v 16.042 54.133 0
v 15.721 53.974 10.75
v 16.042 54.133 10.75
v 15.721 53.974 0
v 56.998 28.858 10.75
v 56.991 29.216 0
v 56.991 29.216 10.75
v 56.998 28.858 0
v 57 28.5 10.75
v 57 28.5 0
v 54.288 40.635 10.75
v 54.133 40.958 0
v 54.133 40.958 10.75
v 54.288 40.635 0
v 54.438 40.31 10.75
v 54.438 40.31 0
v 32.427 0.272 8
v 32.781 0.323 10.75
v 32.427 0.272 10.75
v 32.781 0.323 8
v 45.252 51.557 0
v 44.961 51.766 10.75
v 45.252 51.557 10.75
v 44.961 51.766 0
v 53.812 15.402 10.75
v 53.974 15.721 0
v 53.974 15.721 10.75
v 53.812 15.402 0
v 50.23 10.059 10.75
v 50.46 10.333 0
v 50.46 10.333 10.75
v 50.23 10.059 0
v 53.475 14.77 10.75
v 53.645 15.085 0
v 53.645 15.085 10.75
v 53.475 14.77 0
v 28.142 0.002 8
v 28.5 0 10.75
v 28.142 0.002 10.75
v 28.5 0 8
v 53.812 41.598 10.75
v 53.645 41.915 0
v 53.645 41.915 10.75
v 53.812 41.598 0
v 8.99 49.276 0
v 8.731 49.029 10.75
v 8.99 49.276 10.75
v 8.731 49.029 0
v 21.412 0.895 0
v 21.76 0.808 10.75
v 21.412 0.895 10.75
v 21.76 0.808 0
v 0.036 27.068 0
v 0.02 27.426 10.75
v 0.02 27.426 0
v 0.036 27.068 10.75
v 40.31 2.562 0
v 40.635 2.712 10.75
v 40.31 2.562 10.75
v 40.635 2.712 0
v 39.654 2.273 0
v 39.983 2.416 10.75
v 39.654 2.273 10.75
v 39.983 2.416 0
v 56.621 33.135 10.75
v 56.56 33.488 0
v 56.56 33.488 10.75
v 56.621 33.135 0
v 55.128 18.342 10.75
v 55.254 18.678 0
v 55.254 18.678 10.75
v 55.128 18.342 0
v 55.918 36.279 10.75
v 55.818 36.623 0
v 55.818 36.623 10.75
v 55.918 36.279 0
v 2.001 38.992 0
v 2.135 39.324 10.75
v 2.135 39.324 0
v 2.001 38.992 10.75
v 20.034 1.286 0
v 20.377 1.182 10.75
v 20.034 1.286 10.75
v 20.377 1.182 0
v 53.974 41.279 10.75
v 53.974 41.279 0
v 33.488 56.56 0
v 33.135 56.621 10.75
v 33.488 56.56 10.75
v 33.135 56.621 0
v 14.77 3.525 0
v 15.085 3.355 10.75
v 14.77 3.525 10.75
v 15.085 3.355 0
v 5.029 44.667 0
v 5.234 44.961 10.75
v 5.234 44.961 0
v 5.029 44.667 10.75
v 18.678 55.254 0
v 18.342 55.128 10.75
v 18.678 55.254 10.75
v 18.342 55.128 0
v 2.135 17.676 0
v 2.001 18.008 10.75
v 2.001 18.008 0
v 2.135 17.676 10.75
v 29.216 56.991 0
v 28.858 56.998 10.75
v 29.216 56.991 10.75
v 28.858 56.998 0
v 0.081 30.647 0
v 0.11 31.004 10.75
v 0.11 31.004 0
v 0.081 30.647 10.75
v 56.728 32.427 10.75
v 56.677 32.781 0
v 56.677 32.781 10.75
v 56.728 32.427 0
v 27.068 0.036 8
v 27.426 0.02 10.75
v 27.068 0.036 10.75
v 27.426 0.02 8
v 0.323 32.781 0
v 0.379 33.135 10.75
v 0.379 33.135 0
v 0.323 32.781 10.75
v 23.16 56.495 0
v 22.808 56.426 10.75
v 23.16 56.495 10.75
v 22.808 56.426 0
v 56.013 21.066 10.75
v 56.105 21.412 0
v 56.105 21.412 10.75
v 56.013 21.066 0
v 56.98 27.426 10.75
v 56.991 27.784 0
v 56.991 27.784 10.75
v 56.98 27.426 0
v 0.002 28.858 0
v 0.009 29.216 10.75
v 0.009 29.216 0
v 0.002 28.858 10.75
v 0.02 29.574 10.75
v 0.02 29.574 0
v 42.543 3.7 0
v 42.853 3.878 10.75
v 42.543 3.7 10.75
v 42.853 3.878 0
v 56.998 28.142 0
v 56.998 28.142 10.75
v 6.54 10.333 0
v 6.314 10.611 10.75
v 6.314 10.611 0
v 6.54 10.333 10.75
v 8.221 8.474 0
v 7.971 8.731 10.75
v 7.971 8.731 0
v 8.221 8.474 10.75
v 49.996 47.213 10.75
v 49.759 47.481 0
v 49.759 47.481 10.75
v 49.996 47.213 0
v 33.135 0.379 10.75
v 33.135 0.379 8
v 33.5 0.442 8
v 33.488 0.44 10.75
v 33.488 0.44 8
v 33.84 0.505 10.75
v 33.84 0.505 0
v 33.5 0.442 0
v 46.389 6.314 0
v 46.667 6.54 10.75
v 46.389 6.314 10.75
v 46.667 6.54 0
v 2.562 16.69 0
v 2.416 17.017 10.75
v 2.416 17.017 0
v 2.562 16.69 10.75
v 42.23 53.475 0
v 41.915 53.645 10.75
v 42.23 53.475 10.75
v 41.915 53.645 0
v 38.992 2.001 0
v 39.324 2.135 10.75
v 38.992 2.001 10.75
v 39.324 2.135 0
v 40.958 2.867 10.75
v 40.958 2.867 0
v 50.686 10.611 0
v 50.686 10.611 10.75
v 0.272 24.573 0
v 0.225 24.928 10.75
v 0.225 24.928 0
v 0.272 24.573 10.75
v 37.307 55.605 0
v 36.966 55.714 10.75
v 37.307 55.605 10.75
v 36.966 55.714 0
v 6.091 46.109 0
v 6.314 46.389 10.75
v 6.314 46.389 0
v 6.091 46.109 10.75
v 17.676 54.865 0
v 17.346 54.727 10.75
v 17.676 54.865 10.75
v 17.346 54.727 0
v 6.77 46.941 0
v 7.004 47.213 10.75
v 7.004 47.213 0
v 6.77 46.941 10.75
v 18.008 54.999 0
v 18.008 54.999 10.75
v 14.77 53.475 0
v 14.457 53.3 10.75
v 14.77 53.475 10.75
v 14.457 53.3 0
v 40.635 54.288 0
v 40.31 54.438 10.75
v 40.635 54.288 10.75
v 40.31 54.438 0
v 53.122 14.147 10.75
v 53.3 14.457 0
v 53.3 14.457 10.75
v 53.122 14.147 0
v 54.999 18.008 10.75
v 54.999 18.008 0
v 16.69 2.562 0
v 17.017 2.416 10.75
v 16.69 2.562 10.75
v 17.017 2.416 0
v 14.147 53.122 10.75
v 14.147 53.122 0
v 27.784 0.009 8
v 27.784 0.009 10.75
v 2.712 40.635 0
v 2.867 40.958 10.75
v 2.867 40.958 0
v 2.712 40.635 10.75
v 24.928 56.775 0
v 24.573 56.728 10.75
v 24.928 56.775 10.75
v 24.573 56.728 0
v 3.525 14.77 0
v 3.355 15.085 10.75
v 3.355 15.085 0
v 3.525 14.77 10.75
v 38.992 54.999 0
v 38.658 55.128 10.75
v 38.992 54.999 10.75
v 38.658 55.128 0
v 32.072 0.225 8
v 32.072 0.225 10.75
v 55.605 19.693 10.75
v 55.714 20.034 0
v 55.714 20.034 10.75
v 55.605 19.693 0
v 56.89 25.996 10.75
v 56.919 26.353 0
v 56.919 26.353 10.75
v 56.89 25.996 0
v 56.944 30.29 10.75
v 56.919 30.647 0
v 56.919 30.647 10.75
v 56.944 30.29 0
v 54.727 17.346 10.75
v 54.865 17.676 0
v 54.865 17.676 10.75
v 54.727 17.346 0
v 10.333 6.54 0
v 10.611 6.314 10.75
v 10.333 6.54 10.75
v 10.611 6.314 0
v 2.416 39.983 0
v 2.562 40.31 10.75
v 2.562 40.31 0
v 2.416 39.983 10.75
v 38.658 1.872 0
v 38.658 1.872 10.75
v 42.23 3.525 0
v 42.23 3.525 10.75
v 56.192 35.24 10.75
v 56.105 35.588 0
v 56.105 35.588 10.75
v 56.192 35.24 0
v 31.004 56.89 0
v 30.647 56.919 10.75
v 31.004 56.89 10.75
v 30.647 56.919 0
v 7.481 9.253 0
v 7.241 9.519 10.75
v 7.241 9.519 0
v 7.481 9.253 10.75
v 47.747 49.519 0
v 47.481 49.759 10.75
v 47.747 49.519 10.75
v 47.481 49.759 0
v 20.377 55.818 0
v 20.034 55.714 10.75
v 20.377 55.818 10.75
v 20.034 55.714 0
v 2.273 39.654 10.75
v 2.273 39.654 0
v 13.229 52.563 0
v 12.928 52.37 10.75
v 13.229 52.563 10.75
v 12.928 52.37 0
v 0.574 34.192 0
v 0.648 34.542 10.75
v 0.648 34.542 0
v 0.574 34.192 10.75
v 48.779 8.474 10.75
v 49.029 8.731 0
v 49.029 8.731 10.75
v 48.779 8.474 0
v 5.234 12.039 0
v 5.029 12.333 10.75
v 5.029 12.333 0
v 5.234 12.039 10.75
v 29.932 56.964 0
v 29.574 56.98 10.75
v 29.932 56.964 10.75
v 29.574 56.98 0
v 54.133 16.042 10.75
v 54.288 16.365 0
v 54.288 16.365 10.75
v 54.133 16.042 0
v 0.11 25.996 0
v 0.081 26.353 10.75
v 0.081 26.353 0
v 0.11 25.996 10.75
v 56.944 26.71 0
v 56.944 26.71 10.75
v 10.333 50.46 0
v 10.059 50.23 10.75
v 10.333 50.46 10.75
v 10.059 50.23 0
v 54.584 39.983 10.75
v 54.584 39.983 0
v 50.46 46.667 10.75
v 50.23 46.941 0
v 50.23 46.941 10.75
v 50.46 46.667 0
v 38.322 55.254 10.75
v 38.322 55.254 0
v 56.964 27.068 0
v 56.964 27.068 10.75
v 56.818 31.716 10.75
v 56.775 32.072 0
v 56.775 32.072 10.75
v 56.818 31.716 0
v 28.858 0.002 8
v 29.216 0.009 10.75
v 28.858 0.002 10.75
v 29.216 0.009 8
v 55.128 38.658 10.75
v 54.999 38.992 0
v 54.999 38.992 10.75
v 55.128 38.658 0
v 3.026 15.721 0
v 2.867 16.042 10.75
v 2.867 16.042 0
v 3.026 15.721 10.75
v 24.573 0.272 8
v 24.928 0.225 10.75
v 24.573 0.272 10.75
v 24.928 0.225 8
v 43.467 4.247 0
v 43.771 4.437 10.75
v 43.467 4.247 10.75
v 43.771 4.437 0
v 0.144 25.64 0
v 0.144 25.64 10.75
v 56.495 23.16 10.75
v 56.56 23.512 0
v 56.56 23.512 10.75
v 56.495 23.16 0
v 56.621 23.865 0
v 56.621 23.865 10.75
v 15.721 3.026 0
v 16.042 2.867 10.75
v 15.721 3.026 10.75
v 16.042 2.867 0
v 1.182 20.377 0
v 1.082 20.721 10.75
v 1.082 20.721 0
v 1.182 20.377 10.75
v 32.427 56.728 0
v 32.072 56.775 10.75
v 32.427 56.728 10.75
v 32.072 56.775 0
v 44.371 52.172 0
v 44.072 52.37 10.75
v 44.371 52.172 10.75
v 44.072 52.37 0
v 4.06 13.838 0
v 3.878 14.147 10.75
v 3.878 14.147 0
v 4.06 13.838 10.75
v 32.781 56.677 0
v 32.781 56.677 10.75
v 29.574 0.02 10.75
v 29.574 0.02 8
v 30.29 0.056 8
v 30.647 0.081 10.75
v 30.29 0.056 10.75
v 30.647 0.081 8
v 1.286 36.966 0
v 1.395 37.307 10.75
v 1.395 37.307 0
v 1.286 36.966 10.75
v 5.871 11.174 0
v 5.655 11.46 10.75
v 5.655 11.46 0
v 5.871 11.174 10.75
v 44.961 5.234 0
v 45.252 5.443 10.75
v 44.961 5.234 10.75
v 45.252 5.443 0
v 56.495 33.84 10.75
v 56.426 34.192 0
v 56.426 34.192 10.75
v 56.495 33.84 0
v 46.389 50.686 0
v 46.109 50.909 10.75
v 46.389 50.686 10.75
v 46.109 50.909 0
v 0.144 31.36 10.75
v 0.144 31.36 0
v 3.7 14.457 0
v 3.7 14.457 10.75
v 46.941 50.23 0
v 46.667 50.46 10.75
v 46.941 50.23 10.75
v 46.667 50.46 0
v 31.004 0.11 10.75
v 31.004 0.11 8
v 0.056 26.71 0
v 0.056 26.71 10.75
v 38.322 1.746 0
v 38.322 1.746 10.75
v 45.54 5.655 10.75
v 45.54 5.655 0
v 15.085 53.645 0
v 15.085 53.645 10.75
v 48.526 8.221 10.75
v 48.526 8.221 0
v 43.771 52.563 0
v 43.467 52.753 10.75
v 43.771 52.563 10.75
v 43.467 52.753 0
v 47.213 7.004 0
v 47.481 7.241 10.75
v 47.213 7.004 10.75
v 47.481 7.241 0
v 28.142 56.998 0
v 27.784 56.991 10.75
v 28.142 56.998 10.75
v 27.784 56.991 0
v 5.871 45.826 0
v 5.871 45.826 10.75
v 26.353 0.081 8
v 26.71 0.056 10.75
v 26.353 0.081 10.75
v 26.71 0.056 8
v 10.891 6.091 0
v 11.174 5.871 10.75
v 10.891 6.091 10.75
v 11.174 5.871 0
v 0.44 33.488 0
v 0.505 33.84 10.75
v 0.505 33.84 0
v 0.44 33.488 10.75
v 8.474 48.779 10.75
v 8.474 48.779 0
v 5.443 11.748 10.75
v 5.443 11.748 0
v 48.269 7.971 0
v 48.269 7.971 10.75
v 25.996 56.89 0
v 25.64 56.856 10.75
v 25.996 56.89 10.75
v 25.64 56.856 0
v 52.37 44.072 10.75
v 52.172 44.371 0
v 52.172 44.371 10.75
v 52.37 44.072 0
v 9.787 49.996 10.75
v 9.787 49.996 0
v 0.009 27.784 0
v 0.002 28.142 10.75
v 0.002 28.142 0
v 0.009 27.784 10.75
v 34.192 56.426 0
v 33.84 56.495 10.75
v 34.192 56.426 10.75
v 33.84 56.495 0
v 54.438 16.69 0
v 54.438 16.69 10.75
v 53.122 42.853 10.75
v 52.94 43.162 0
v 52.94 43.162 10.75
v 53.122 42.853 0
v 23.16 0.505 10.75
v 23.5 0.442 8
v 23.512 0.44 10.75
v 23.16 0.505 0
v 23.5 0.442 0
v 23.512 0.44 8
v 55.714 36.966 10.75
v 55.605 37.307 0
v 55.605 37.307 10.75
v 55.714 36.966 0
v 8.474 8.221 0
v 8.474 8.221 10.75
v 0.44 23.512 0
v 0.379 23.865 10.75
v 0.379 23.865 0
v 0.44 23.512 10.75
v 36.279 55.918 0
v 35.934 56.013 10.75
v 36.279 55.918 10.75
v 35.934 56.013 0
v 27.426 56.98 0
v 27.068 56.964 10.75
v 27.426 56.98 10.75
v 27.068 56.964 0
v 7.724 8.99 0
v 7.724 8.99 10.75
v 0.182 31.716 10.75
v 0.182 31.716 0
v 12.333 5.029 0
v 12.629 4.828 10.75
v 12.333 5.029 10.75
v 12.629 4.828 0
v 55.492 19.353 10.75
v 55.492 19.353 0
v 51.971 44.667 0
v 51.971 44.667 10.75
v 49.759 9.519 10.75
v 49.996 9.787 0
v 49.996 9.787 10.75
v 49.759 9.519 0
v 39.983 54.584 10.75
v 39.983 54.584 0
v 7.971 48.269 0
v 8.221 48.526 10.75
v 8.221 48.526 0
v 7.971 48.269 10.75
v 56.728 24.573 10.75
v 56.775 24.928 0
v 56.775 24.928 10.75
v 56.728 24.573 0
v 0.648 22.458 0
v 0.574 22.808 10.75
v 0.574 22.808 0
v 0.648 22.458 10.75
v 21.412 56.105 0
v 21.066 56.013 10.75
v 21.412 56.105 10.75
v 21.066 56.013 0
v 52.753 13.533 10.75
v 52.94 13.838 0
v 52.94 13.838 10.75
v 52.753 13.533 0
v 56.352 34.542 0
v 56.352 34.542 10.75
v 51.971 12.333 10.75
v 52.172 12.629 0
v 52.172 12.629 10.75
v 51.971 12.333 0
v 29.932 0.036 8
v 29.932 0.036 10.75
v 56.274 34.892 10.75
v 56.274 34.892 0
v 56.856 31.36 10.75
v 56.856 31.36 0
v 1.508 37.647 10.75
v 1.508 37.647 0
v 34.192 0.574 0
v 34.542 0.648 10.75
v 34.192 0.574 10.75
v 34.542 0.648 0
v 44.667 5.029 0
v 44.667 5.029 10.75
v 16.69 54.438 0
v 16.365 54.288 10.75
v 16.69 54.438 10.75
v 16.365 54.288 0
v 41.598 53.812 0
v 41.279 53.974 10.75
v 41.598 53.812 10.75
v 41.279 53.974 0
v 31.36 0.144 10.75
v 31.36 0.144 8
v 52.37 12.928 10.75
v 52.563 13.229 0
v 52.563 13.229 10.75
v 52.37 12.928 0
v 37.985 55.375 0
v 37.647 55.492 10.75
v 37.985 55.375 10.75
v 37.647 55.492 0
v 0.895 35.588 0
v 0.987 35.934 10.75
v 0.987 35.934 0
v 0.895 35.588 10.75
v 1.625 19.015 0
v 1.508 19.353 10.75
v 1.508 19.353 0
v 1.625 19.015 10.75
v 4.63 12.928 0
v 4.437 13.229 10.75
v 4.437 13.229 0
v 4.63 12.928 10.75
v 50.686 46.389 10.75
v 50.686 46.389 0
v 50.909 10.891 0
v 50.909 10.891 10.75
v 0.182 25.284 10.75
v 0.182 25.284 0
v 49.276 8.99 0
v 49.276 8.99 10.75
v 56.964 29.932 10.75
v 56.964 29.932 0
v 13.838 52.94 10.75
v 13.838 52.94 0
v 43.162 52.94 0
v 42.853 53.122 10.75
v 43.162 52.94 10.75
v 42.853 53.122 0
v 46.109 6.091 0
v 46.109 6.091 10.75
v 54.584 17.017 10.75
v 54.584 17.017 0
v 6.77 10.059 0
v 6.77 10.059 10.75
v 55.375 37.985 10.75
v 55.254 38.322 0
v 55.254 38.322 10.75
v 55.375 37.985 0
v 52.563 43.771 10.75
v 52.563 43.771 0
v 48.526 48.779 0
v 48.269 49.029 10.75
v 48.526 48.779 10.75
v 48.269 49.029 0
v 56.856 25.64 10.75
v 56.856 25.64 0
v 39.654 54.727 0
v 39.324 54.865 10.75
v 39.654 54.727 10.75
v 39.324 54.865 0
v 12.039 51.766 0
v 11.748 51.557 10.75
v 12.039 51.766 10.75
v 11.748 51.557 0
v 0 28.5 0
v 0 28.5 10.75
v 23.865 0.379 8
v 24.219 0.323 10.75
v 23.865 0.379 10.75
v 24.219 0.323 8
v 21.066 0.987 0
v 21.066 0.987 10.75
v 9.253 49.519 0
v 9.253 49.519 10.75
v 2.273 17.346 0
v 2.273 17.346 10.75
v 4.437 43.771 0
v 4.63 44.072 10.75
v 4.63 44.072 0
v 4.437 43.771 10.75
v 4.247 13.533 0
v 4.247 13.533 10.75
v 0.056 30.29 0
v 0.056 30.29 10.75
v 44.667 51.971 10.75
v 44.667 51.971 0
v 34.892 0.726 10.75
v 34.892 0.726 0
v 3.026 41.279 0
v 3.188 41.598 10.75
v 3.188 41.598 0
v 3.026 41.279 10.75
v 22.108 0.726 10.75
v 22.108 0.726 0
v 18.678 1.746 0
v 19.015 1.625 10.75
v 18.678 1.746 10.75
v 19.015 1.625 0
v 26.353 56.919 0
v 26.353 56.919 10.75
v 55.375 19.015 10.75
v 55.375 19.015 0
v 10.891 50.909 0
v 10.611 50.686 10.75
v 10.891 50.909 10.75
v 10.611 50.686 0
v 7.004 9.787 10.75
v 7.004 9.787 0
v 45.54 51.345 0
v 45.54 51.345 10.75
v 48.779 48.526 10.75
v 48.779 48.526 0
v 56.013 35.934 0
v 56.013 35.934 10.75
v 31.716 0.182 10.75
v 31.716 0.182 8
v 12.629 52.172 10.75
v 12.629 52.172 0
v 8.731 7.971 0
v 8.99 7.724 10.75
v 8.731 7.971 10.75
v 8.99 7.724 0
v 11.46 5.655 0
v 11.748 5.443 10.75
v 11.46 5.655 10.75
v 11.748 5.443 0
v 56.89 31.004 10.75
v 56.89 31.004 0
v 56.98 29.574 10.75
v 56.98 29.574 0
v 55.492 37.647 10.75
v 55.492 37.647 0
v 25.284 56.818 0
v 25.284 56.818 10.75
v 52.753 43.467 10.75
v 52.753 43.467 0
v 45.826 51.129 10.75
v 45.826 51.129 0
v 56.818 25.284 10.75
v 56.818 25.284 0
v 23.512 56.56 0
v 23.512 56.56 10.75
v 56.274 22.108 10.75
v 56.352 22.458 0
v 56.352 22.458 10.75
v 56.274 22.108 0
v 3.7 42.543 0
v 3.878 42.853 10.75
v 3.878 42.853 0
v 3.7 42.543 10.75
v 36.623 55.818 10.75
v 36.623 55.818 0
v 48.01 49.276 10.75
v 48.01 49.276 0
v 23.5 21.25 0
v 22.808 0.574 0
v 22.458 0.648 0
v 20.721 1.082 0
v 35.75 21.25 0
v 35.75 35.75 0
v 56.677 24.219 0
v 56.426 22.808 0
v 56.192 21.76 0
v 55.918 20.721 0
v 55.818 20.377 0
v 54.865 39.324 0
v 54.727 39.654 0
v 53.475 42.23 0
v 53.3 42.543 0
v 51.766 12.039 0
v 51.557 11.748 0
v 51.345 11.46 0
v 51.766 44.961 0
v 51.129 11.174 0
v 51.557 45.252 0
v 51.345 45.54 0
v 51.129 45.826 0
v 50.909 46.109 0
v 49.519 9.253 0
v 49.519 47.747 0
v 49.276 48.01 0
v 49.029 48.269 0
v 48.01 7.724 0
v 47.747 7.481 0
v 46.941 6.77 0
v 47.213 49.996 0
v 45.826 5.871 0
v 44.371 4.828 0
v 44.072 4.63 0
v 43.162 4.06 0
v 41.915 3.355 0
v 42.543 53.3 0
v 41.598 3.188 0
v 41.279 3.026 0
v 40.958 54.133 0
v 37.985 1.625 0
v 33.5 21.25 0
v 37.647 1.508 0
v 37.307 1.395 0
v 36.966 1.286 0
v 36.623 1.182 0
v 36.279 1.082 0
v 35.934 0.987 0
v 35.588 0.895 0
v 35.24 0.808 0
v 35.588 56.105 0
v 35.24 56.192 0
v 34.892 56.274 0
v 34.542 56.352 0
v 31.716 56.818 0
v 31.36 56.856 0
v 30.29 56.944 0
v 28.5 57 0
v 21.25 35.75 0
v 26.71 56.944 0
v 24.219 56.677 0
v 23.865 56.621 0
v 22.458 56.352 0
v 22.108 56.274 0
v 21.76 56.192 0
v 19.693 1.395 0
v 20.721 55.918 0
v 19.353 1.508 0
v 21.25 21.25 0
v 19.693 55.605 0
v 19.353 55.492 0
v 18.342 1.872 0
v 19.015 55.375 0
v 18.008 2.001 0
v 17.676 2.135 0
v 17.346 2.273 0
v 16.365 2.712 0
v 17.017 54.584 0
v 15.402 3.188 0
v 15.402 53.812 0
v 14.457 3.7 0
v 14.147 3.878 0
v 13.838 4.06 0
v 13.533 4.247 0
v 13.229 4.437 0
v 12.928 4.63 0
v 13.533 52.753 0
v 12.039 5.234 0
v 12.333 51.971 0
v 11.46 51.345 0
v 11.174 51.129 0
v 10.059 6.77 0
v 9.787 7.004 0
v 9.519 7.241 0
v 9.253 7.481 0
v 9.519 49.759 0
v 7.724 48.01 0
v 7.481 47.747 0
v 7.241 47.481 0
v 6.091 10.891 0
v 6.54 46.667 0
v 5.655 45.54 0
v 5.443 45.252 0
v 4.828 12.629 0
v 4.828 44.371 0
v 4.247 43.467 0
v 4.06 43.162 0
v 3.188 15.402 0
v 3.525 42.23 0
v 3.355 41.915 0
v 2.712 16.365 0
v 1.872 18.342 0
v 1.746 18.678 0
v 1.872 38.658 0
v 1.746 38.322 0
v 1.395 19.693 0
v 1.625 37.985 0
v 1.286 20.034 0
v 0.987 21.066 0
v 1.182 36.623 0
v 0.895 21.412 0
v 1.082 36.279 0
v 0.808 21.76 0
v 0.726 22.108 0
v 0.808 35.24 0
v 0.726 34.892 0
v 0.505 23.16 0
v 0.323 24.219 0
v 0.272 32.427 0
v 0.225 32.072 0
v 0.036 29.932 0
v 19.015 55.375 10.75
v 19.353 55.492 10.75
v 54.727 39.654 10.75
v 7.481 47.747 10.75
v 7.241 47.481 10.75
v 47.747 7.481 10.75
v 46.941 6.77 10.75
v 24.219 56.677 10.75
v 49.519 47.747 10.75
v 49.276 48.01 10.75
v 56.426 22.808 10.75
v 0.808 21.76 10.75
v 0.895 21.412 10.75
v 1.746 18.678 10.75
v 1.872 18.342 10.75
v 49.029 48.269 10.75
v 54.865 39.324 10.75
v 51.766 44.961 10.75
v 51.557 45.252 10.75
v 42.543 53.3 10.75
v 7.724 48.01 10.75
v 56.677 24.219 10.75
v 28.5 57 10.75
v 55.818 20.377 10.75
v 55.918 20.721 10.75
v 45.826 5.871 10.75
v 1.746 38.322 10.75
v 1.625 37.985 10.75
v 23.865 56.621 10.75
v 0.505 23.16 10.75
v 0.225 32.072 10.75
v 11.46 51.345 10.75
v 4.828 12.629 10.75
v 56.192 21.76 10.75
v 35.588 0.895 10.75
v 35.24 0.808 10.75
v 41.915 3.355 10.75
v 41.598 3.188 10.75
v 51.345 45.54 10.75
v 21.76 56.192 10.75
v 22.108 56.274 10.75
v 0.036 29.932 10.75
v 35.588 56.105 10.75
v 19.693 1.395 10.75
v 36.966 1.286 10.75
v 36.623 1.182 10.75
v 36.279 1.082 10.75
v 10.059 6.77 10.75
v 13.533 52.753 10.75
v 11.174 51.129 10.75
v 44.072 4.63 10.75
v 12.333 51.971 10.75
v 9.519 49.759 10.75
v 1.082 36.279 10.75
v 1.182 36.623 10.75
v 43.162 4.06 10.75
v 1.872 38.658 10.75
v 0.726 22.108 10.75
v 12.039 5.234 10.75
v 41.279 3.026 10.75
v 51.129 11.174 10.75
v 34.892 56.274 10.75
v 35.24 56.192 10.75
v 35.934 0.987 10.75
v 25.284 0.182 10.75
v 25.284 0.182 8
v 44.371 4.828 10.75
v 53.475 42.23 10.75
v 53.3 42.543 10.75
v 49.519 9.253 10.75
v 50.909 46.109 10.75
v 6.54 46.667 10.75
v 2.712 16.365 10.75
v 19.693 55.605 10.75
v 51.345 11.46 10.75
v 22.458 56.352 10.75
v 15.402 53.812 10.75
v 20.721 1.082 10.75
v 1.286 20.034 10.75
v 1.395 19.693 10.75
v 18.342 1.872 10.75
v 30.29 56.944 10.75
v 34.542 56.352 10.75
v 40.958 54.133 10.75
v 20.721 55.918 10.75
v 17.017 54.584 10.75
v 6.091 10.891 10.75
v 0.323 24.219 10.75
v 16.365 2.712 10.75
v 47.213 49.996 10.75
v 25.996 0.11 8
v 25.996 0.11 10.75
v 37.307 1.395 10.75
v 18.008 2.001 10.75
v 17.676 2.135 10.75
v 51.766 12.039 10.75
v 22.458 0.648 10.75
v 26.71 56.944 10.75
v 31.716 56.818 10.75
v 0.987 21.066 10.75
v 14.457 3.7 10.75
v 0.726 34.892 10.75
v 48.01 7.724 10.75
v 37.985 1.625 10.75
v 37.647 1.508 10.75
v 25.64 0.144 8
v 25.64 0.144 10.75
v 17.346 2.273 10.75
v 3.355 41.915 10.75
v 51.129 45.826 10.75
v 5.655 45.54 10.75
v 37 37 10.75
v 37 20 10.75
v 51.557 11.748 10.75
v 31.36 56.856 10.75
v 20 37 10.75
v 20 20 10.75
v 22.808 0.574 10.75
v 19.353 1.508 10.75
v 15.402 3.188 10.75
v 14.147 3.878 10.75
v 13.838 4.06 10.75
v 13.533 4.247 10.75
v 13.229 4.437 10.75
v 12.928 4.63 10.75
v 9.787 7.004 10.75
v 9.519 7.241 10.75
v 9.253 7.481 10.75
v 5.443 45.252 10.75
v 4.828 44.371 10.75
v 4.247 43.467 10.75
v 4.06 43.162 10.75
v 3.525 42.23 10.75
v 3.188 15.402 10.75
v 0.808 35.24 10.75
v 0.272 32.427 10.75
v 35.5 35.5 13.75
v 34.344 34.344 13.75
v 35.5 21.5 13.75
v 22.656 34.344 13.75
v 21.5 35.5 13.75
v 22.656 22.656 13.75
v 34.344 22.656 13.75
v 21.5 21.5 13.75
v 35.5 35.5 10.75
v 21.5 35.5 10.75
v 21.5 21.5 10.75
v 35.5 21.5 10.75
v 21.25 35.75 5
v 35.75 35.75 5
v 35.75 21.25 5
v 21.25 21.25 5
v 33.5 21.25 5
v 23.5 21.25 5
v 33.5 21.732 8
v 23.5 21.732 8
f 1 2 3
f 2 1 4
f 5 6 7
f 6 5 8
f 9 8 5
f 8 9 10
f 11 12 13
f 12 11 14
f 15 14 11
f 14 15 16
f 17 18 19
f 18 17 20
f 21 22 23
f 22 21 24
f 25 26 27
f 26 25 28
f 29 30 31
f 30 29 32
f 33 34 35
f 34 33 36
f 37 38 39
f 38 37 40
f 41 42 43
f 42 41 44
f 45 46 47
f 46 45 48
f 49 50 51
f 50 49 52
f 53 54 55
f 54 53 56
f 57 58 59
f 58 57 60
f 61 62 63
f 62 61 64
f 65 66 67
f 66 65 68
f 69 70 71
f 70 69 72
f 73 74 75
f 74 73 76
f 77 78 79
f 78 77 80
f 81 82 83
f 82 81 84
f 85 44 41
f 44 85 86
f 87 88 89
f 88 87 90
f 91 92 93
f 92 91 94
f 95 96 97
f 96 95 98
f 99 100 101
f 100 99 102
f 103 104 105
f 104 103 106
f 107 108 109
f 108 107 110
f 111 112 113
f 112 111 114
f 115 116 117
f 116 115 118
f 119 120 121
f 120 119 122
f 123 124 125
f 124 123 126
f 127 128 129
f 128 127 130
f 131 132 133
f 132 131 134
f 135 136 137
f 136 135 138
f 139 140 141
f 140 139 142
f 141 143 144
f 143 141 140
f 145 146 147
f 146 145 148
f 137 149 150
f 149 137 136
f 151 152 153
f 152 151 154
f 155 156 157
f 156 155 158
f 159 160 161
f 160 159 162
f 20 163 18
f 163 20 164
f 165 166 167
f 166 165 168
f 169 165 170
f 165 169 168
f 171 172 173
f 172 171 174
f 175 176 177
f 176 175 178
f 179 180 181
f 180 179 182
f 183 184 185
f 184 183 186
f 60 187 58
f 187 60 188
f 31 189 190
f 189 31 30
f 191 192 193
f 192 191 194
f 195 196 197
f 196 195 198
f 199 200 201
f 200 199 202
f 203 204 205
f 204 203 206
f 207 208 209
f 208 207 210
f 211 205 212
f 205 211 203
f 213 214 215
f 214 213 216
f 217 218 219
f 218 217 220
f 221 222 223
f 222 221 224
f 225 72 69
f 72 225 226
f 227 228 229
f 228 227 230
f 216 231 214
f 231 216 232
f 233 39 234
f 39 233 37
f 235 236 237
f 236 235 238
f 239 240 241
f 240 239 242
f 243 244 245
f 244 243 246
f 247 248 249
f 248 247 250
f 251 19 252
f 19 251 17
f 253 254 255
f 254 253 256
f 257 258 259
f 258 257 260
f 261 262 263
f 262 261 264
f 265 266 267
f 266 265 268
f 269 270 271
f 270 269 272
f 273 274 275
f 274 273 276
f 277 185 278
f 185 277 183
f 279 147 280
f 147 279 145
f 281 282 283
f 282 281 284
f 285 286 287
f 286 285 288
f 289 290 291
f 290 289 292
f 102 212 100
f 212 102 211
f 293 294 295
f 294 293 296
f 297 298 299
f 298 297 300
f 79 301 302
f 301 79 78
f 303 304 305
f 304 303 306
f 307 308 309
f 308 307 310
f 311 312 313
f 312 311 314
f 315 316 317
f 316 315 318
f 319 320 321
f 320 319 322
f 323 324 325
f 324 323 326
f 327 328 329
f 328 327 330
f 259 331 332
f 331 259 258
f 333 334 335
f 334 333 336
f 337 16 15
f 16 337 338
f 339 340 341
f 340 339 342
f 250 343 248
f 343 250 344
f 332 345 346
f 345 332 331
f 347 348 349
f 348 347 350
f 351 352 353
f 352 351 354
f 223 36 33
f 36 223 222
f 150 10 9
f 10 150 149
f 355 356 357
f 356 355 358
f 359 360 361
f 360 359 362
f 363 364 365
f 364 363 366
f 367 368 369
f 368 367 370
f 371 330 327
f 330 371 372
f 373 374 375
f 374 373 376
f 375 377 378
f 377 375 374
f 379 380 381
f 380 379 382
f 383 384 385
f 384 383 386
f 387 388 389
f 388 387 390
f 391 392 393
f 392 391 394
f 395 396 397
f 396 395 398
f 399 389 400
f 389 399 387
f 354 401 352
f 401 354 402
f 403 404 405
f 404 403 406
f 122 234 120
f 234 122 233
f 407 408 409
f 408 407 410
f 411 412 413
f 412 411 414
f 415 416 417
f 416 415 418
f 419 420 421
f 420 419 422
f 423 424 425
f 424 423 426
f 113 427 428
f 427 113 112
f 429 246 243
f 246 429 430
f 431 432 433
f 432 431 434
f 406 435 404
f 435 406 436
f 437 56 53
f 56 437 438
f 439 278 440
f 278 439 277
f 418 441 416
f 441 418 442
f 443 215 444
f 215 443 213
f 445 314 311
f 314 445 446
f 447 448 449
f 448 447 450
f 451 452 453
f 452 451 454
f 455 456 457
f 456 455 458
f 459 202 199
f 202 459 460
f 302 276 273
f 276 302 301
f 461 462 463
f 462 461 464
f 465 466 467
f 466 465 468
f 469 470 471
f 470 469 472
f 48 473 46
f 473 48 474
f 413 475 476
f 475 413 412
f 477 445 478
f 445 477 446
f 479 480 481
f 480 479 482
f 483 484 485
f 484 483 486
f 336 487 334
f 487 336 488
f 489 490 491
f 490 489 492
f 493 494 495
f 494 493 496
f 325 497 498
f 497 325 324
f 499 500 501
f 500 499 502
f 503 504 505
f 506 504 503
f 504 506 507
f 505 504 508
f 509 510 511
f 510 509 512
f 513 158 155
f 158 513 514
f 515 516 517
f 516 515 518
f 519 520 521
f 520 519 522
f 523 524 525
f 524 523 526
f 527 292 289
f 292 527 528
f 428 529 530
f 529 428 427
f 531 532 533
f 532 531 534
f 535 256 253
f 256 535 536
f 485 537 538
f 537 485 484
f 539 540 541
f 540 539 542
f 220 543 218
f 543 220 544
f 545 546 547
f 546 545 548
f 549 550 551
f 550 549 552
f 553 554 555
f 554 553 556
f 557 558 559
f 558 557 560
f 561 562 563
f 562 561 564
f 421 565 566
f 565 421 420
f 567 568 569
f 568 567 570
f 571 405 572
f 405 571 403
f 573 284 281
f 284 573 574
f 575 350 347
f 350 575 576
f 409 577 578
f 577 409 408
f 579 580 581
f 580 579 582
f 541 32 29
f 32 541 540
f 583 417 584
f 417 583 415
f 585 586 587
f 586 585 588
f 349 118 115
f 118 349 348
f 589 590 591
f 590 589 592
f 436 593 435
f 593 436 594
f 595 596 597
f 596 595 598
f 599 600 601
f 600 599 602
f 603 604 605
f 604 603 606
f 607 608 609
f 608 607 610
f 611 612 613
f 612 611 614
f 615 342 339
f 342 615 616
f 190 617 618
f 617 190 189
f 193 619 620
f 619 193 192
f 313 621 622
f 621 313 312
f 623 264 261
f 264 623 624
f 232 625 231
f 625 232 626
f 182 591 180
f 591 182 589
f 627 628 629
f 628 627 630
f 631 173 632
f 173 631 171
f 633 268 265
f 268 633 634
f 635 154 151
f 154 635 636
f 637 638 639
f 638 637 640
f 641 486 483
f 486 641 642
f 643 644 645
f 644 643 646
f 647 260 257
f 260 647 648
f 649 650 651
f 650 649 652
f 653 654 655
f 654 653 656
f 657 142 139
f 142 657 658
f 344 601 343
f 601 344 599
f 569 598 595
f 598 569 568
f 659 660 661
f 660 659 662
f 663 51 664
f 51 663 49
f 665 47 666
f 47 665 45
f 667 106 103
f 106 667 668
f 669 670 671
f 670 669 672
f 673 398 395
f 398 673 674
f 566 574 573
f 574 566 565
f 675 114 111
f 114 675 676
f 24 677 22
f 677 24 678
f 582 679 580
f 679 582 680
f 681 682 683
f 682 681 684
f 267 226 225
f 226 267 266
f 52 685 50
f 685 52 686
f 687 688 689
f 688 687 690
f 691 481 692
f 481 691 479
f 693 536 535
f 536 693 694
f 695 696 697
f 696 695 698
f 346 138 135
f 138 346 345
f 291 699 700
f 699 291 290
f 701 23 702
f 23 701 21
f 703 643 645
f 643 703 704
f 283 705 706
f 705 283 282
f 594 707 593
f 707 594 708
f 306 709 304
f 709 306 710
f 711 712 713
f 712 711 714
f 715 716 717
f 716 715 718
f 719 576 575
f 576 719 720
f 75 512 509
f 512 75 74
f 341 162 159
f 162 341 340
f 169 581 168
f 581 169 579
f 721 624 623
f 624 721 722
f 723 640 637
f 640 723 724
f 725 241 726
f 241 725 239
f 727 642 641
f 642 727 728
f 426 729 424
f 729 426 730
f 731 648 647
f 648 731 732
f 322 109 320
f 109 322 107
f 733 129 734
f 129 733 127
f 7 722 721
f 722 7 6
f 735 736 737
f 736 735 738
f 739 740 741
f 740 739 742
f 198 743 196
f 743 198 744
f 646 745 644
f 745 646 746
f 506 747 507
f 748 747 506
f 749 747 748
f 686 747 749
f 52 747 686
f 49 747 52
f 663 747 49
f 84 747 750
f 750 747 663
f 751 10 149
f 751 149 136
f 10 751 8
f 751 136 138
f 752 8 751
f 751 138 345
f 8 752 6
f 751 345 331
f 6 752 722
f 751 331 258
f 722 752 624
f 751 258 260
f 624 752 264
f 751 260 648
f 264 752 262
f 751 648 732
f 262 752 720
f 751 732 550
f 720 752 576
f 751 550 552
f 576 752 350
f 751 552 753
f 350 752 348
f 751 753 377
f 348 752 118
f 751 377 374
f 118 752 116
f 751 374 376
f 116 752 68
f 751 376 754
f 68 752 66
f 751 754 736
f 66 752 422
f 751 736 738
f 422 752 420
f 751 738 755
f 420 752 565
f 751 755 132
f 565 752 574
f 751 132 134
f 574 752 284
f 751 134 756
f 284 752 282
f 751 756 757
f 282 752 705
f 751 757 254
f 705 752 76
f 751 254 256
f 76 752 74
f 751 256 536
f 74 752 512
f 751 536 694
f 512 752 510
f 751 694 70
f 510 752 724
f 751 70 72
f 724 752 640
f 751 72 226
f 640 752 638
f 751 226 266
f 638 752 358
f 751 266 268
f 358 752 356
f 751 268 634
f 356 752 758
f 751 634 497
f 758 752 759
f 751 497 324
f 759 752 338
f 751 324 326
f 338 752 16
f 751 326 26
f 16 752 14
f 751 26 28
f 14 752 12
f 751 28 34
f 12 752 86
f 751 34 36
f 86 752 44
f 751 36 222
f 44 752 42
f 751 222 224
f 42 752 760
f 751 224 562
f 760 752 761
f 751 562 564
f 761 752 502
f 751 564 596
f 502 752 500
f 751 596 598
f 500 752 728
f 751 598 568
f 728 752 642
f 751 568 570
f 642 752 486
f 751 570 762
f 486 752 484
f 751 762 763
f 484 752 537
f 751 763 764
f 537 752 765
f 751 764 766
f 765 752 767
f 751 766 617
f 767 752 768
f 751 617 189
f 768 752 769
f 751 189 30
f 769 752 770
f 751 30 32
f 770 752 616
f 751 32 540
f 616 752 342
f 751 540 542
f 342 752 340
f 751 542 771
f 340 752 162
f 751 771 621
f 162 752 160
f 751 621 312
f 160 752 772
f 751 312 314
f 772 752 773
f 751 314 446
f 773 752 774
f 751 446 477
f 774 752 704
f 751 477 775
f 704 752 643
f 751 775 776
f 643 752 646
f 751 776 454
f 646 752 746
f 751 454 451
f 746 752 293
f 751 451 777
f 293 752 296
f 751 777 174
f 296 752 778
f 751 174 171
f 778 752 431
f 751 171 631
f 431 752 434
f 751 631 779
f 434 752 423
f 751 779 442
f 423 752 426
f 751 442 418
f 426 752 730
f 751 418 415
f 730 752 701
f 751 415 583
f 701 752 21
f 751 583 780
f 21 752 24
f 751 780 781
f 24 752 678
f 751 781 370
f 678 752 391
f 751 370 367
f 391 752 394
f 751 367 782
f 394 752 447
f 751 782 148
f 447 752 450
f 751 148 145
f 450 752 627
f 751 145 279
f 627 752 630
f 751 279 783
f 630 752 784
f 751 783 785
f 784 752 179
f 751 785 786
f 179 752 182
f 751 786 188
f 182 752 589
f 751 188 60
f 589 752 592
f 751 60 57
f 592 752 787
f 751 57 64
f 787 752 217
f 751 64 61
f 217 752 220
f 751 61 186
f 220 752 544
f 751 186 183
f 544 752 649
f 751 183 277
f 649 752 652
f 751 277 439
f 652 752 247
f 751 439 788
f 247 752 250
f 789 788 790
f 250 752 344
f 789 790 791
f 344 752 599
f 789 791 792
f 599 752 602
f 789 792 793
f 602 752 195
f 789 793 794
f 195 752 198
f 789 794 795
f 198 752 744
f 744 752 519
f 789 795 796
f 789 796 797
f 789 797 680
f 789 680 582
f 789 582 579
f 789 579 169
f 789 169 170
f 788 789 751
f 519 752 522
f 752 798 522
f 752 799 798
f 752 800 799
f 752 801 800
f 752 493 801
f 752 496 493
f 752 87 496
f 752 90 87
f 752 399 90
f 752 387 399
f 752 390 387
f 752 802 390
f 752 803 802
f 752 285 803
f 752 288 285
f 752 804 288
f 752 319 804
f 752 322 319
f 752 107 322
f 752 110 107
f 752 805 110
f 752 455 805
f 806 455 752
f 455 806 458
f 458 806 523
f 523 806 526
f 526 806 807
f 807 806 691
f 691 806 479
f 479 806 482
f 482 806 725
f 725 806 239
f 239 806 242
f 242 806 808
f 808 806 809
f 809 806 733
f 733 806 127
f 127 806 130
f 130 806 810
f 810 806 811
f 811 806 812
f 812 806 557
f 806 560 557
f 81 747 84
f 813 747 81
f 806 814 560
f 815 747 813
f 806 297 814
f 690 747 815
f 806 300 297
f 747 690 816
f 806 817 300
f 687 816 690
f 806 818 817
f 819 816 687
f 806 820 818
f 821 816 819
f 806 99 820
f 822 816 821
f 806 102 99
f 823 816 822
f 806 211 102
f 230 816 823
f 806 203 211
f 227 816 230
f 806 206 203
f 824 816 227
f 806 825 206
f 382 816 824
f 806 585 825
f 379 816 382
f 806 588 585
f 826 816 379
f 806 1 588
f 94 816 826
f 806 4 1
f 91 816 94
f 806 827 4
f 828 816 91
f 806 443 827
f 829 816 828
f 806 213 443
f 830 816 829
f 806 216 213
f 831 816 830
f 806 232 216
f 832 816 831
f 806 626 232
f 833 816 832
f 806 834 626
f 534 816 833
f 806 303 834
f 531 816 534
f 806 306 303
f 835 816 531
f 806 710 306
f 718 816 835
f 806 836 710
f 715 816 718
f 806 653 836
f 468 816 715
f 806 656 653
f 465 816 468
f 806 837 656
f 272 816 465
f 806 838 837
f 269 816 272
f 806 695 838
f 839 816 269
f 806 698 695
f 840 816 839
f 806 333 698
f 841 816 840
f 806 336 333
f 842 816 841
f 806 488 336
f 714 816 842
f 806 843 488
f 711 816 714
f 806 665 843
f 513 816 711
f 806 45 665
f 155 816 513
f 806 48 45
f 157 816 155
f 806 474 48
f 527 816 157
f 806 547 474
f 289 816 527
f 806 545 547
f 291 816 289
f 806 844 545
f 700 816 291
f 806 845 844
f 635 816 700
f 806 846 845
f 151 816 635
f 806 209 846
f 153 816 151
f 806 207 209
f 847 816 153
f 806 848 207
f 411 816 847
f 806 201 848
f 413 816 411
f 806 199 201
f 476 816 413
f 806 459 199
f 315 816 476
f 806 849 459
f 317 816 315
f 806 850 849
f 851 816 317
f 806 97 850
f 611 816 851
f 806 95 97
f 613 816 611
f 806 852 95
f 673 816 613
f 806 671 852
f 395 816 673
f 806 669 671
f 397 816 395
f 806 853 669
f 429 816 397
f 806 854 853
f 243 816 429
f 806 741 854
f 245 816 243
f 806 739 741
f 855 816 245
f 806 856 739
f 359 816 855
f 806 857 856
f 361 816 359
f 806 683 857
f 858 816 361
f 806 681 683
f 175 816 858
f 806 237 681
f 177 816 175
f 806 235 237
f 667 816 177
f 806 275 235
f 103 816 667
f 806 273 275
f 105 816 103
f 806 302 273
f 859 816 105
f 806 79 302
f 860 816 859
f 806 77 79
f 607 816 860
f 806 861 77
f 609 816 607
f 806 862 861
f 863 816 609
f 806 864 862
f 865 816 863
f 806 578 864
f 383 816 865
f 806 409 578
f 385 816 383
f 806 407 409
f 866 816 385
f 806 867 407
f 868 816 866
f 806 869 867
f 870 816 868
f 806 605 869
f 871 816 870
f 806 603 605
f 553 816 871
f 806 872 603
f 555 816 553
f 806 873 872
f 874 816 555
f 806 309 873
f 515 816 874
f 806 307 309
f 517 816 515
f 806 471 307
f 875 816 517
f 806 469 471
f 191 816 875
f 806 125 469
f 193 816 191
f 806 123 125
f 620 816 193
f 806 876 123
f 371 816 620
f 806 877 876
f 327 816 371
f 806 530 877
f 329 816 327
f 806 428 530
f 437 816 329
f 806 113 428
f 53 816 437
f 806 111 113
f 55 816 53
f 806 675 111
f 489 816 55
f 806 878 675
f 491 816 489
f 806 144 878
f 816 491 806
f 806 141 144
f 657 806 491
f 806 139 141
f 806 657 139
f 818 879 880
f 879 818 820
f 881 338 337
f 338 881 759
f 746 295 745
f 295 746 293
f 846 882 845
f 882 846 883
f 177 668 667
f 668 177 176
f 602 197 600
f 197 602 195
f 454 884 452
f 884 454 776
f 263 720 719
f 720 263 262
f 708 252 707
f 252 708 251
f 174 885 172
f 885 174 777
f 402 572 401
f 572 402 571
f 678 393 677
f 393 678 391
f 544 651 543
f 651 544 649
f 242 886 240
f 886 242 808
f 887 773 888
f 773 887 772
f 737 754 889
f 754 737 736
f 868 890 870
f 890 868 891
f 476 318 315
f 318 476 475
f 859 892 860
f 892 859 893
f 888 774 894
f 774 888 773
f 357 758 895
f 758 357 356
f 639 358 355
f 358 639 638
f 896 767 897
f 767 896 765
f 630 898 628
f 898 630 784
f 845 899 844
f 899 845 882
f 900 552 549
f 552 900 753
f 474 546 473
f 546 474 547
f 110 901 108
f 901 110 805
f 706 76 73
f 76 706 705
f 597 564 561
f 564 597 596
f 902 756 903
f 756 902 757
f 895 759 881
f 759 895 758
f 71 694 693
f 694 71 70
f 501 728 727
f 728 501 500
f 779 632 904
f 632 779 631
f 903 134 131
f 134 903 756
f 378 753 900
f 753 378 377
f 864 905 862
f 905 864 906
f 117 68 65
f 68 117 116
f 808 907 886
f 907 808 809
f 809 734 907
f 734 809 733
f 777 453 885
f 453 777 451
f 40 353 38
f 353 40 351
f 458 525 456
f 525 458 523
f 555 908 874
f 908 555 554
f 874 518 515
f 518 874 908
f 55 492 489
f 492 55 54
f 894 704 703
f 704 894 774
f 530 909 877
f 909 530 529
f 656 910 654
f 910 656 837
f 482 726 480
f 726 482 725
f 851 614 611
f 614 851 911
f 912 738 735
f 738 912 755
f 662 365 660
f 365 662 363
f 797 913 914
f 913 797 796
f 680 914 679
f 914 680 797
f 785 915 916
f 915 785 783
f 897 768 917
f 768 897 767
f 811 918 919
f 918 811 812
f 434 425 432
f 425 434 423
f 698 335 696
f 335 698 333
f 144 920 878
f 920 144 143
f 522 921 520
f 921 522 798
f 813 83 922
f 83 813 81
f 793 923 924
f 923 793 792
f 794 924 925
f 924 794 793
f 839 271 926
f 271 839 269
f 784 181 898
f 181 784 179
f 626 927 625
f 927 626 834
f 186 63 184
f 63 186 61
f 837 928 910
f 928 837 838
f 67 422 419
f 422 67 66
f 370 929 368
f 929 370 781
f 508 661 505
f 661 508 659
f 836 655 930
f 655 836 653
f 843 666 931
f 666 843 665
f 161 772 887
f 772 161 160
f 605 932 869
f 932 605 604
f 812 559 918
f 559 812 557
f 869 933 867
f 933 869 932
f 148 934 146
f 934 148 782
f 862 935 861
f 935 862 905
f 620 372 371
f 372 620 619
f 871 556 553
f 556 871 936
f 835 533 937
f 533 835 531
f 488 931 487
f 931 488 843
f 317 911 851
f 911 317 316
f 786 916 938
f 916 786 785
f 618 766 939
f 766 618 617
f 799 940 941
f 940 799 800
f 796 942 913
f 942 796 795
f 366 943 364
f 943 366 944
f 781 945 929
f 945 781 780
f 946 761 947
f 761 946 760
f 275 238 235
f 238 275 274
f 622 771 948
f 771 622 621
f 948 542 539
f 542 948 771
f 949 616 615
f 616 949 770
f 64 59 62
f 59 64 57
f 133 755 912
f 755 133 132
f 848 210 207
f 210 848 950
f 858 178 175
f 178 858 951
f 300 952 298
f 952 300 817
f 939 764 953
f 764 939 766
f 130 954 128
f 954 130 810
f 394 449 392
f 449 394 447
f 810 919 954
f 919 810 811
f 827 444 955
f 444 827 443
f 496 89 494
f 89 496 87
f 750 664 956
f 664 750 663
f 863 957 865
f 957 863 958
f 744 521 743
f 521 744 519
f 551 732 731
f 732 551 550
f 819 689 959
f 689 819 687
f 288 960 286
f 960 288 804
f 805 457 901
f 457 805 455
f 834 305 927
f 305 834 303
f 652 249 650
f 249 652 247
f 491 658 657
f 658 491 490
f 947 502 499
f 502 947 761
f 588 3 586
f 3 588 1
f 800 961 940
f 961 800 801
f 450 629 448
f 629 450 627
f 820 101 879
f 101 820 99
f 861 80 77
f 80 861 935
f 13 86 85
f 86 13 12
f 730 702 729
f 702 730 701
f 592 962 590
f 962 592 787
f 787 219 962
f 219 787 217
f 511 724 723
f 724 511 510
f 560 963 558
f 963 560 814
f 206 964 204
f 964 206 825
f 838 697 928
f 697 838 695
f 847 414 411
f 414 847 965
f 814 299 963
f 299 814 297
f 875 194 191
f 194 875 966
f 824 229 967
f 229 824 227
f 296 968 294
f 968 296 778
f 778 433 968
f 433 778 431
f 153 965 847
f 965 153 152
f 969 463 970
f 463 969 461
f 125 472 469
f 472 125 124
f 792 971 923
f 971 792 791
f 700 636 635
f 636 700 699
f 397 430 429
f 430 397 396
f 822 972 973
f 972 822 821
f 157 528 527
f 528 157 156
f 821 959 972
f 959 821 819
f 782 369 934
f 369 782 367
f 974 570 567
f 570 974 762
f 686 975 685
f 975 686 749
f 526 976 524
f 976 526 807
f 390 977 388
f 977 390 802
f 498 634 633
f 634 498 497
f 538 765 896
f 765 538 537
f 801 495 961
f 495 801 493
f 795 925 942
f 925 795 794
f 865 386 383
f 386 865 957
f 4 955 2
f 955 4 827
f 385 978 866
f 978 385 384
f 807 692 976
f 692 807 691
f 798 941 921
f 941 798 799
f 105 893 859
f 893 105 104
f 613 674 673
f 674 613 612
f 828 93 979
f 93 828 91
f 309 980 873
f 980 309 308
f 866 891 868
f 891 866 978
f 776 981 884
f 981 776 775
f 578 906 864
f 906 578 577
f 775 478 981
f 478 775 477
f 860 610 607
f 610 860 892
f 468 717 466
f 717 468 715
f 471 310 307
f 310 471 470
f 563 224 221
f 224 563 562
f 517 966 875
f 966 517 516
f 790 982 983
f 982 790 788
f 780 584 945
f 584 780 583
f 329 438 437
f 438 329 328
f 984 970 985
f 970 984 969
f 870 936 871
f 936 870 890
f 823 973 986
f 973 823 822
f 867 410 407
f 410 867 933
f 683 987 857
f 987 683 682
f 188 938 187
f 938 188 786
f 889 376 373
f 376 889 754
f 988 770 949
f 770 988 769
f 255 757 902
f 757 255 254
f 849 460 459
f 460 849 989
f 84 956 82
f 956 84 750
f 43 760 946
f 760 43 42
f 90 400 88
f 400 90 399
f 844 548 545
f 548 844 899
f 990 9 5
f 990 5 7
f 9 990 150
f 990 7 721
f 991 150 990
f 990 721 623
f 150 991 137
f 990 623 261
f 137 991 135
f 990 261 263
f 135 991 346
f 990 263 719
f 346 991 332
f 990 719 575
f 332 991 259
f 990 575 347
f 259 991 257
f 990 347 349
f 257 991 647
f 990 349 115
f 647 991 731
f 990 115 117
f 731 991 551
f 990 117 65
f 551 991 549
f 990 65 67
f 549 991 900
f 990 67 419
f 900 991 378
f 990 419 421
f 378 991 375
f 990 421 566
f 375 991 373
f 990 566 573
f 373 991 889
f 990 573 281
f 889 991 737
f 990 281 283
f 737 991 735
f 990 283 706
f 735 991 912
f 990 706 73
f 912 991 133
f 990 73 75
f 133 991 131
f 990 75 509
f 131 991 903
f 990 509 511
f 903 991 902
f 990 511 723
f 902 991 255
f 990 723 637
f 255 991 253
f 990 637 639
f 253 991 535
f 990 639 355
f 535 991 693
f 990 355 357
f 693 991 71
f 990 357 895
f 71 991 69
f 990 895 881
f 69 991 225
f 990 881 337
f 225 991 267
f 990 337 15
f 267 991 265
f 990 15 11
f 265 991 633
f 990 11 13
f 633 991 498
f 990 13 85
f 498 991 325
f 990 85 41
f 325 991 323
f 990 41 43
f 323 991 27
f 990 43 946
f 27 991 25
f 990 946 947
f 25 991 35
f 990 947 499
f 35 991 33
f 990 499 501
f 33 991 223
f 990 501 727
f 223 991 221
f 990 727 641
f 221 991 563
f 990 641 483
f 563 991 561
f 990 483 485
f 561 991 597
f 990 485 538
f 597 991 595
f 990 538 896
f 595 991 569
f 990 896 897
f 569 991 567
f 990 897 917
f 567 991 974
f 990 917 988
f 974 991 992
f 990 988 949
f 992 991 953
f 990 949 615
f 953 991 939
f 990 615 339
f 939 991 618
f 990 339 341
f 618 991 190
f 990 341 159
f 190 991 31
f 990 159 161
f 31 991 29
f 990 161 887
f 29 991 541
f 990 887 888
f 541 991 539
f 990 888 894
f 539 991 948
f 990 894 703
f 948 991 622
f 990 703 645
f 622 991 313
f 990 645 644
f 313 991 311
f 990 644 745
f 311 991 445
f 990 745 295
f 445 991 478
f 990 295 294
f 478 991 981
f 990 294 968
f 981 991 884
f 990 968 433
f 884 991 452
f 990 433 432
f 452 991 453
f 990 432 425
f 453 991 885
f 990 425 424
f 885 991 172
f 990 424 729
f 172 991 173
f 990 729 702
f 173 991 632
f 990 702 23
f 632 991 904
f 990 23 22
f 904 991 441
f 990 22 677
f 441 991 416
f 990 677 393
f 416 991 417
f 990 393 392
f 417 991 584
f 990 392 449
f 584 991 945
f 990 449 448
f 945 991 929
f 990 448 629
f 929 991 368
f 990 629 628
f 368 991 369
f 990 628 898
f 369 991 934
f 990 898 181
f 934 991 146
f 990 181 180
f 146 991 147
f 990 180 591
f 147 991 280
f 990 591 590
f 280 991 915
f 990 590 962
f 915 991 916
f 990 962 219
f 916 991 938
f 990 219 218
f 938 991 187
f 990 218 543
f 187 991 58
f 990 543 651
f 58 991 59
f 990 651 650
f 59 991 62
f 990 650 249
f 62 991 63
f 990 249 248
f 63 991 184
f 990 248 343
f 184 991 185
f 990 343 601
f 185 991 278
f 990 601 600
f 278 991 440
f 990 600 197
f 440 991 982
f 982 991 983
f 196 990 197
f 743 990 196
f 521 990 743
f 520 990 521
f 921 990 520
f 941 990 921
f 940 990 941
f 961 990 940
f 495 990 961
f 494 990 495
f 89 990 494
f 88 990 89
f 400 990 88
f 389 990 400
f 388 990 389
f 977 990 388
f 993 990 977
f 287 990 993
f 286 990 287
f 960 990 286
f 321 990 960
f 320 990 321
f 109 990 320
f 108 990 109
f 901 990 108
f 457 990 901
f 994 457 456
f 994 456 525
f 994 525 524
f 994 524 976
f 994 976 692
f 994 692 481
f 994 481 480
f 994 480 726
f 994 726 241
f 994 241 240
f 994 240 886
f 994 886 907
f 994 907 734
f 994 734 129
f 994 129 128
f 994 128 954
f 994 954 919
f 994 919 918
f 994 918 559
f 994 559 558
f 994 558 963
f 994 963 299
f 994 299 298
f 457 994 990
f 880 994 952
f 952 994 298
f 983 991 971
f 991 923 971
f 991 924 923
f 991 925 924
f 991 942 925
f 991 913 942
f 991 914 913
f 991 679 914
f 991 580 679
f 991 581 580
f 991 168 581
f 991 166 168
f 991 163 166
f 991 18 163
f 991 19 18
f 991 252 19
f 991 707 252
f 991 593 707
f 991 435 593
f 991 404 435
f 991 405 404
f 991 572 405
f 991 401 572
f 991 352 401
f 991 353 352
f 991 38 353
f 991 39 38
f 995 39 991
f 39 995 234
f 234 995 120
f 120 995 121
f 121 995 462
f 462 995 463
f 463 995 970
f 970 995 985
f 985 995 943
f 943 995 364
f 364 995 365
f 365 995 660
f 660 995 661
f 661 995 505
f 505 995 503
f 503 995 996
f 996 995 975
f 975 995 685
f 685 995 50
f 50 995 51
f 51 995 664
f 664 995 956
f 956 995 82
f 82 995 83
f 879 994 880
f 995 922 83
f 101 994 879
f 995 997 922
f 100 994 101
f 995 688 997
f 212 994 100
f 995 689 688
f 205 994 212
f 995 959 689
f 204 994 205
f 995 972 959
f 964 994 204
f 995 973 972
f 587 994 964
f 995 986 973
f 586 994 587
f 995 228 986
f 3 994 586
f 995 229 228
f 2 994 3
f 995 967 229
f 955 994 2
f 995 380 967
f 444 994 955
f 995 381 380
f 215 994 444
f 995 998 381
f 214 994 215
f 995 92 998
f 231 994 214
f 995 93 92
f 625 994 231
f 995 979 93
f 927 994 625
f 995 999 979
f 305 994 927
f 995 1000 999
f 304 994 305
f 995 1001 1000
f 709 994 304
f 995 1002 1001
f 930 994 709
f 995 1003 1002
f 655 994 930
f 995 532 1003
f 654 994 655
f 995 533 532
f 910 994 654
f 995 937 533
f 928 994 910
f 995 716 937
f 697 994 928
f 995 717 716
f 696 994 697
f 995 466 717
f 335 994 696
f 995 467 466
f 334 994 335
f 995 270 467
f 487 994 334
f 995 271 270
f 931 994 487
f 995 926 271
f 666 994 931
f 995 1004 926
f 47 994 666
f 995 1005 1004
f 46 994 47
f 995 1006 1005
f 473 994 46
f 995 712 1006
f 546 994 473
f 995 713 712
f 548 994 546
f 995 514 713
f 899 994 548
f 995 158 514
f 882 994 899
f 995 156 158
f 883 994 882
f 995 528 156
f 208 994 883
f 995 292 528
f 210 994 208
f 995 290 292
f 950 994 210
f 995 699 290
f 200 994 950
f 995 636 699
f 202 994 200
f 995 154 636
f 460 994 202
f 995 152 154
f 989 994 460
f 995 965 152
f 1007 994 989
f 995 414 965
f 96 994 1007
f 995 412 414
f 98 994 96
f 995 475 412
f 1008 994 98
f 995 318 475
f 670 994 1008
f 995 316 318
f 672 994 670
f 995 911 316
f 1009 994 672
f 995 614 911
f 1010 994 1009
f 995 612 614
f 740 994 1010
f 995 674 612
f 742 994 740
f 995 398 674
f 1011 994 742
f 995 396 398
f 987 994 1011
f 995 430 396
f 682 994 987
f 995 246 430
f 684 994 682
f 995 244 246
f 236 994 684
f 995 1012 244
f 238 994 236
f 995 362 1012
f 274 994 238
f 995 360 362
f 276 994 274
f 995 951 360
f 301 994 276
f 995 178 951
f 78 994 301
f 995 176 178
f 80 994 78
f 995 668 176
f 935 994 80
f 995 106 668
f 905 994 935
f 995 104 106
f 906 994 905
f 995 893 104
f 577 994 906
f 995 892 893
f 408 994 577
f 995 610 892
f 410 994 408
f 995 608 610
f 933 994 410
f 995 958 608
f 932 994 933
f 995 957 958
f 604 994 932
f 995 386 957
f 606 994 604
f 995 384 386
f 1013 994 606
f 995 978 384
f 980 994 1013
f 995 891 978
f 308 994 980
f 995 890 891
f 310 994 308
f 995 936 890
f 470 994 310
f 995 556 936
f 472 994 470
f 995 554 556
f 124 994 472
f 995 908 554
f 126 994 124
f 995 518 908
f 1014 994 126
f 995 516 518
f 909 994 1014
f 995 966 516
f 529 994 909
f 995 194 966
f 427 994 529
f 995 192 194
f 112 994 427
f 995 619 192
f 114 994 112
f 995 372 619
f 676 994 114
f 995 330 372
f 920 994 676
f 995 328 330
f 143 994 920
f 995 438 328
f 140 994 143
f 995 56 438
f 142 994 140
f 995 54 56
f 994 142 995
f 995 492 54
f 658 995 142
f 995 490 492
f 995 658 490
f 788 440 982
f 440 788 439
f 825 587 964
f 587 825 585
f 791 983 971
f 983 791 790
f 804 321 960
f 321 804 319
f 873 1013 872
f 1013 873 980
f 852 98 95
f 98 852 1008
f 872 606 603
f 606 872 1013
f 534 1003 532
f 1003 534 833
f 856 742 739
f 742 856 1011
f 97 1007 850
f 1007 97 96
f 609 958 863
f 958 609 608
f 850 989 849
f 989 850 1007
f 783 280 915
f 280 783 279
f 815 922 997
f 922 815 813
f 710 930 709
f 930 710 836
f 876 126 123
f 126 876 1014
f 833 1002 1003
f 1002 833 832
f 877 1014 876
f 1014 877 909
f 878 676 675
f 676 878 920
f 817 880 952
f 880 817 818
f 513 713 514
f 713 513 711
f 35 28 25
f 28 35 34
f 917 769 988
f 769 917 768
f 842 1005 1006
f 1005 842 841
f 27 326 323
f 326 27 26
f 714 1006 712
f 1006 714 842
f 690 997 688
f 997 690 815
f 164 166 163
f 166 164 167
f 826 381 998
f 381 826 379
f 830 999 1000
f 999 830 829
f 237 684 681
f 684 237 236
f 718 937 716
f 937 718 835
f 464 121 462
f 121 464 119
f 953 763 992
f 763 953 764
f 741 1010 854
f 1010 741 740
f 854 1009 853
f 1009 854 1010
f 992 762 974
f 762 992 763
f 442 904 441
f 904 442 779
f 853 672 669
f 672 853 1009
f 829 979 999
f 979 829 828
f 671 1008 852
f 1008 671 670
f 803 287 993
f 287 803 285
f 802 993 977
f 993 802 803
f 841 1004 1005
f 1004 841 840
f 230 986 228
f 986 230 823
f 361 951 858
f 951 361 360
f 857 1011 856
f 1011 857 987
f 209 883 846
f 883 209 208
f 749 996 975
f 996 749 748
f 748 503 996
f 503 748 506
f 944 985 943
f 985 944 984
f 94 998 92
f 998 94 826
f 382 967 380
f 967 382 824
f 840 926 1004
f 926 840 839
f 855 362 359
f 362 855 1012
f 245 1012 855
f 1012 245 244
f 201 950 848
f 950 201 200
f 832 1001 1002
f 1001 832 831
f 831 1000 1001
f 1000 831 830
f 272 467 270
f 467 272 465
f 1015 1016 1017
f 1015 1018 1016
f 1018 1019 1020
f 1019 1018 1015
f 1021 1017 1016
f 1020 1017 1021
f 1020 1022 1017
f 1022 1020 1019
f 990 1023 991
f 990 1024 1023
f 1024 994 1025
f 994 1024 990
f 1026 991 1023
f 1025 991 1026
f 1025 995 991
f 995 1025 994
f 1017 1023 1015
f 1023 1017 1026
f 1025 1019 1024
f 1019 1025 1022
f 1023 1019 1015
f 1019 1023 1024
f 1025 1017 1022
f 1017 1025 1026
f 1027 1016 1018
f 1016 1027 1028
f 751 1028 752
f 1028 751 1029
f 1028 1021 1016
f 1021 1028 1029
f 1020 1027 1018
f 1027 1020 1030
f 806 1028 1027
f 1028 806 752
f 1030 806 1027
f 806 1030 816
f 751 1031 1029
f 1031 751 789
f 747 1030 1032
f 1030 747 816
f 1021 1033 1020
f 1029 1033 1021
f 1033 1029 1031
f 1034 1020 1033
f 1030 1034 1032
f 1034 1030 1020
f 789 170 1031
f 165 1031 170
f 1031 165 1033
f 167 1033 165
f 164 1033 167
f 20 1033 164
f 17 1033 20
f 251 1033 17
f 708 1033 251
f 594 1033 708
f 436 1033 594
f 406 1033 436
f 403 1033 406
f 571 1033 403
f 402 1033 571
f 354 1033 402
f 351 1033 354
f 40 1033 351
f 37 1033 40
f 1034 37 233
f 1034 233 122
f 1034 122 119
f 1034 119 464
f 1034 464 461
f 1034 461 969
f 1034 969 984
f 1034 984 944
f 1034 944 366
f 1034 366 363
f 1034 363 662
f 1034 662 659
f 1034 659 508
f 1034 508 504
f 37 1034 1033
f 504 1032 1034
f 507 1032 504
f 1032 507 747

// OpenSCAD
$fn=500;
width=17;
outerWidth=57;
wallWidth=2;
tabWidth=2;
hd=0.5; // holder distance

module centerCube()
{
	hull()
	{
		translate([2.25,2.25,18]) cube([10,10,1]);
		cube([14.5,14.5,5]);
	}
	
}


module mainCube()
{
	diff = outerWidth - width;
	offset = diff/2;
	innerWidth = width - (wallWidth*2);
	
	difference()
	{
		union()
		{
			translate([outerWidth/2,outerWidth/2,0]) cylinder(d=outerWidth,10.75);
			color("blue") translate([offset,offset,0]) cube([width,width,13.75]);
		}
		
		
		translate([offset+1.25,offset+1.25,0]) centerCube();
		//translate([offset-wallWidth,offset+(wallWidth),6]) rotate([0,0,-45]) cube([wallWidth*3,wallWidth*5,15]);
		translate([offset,offset,10.75]) difference()
		{
		cube([width,width,3]);
		translate([wallWidth-0.5, wallWidth-0.5,0]) cube([width-(wallWidth*2)+1,width-(wallWidth*2)+1,3]);
		}
		translate([(outerWidth/2)-5,0,0]) cube([10,30,8]);
		
	}
	
}

mainCube();
